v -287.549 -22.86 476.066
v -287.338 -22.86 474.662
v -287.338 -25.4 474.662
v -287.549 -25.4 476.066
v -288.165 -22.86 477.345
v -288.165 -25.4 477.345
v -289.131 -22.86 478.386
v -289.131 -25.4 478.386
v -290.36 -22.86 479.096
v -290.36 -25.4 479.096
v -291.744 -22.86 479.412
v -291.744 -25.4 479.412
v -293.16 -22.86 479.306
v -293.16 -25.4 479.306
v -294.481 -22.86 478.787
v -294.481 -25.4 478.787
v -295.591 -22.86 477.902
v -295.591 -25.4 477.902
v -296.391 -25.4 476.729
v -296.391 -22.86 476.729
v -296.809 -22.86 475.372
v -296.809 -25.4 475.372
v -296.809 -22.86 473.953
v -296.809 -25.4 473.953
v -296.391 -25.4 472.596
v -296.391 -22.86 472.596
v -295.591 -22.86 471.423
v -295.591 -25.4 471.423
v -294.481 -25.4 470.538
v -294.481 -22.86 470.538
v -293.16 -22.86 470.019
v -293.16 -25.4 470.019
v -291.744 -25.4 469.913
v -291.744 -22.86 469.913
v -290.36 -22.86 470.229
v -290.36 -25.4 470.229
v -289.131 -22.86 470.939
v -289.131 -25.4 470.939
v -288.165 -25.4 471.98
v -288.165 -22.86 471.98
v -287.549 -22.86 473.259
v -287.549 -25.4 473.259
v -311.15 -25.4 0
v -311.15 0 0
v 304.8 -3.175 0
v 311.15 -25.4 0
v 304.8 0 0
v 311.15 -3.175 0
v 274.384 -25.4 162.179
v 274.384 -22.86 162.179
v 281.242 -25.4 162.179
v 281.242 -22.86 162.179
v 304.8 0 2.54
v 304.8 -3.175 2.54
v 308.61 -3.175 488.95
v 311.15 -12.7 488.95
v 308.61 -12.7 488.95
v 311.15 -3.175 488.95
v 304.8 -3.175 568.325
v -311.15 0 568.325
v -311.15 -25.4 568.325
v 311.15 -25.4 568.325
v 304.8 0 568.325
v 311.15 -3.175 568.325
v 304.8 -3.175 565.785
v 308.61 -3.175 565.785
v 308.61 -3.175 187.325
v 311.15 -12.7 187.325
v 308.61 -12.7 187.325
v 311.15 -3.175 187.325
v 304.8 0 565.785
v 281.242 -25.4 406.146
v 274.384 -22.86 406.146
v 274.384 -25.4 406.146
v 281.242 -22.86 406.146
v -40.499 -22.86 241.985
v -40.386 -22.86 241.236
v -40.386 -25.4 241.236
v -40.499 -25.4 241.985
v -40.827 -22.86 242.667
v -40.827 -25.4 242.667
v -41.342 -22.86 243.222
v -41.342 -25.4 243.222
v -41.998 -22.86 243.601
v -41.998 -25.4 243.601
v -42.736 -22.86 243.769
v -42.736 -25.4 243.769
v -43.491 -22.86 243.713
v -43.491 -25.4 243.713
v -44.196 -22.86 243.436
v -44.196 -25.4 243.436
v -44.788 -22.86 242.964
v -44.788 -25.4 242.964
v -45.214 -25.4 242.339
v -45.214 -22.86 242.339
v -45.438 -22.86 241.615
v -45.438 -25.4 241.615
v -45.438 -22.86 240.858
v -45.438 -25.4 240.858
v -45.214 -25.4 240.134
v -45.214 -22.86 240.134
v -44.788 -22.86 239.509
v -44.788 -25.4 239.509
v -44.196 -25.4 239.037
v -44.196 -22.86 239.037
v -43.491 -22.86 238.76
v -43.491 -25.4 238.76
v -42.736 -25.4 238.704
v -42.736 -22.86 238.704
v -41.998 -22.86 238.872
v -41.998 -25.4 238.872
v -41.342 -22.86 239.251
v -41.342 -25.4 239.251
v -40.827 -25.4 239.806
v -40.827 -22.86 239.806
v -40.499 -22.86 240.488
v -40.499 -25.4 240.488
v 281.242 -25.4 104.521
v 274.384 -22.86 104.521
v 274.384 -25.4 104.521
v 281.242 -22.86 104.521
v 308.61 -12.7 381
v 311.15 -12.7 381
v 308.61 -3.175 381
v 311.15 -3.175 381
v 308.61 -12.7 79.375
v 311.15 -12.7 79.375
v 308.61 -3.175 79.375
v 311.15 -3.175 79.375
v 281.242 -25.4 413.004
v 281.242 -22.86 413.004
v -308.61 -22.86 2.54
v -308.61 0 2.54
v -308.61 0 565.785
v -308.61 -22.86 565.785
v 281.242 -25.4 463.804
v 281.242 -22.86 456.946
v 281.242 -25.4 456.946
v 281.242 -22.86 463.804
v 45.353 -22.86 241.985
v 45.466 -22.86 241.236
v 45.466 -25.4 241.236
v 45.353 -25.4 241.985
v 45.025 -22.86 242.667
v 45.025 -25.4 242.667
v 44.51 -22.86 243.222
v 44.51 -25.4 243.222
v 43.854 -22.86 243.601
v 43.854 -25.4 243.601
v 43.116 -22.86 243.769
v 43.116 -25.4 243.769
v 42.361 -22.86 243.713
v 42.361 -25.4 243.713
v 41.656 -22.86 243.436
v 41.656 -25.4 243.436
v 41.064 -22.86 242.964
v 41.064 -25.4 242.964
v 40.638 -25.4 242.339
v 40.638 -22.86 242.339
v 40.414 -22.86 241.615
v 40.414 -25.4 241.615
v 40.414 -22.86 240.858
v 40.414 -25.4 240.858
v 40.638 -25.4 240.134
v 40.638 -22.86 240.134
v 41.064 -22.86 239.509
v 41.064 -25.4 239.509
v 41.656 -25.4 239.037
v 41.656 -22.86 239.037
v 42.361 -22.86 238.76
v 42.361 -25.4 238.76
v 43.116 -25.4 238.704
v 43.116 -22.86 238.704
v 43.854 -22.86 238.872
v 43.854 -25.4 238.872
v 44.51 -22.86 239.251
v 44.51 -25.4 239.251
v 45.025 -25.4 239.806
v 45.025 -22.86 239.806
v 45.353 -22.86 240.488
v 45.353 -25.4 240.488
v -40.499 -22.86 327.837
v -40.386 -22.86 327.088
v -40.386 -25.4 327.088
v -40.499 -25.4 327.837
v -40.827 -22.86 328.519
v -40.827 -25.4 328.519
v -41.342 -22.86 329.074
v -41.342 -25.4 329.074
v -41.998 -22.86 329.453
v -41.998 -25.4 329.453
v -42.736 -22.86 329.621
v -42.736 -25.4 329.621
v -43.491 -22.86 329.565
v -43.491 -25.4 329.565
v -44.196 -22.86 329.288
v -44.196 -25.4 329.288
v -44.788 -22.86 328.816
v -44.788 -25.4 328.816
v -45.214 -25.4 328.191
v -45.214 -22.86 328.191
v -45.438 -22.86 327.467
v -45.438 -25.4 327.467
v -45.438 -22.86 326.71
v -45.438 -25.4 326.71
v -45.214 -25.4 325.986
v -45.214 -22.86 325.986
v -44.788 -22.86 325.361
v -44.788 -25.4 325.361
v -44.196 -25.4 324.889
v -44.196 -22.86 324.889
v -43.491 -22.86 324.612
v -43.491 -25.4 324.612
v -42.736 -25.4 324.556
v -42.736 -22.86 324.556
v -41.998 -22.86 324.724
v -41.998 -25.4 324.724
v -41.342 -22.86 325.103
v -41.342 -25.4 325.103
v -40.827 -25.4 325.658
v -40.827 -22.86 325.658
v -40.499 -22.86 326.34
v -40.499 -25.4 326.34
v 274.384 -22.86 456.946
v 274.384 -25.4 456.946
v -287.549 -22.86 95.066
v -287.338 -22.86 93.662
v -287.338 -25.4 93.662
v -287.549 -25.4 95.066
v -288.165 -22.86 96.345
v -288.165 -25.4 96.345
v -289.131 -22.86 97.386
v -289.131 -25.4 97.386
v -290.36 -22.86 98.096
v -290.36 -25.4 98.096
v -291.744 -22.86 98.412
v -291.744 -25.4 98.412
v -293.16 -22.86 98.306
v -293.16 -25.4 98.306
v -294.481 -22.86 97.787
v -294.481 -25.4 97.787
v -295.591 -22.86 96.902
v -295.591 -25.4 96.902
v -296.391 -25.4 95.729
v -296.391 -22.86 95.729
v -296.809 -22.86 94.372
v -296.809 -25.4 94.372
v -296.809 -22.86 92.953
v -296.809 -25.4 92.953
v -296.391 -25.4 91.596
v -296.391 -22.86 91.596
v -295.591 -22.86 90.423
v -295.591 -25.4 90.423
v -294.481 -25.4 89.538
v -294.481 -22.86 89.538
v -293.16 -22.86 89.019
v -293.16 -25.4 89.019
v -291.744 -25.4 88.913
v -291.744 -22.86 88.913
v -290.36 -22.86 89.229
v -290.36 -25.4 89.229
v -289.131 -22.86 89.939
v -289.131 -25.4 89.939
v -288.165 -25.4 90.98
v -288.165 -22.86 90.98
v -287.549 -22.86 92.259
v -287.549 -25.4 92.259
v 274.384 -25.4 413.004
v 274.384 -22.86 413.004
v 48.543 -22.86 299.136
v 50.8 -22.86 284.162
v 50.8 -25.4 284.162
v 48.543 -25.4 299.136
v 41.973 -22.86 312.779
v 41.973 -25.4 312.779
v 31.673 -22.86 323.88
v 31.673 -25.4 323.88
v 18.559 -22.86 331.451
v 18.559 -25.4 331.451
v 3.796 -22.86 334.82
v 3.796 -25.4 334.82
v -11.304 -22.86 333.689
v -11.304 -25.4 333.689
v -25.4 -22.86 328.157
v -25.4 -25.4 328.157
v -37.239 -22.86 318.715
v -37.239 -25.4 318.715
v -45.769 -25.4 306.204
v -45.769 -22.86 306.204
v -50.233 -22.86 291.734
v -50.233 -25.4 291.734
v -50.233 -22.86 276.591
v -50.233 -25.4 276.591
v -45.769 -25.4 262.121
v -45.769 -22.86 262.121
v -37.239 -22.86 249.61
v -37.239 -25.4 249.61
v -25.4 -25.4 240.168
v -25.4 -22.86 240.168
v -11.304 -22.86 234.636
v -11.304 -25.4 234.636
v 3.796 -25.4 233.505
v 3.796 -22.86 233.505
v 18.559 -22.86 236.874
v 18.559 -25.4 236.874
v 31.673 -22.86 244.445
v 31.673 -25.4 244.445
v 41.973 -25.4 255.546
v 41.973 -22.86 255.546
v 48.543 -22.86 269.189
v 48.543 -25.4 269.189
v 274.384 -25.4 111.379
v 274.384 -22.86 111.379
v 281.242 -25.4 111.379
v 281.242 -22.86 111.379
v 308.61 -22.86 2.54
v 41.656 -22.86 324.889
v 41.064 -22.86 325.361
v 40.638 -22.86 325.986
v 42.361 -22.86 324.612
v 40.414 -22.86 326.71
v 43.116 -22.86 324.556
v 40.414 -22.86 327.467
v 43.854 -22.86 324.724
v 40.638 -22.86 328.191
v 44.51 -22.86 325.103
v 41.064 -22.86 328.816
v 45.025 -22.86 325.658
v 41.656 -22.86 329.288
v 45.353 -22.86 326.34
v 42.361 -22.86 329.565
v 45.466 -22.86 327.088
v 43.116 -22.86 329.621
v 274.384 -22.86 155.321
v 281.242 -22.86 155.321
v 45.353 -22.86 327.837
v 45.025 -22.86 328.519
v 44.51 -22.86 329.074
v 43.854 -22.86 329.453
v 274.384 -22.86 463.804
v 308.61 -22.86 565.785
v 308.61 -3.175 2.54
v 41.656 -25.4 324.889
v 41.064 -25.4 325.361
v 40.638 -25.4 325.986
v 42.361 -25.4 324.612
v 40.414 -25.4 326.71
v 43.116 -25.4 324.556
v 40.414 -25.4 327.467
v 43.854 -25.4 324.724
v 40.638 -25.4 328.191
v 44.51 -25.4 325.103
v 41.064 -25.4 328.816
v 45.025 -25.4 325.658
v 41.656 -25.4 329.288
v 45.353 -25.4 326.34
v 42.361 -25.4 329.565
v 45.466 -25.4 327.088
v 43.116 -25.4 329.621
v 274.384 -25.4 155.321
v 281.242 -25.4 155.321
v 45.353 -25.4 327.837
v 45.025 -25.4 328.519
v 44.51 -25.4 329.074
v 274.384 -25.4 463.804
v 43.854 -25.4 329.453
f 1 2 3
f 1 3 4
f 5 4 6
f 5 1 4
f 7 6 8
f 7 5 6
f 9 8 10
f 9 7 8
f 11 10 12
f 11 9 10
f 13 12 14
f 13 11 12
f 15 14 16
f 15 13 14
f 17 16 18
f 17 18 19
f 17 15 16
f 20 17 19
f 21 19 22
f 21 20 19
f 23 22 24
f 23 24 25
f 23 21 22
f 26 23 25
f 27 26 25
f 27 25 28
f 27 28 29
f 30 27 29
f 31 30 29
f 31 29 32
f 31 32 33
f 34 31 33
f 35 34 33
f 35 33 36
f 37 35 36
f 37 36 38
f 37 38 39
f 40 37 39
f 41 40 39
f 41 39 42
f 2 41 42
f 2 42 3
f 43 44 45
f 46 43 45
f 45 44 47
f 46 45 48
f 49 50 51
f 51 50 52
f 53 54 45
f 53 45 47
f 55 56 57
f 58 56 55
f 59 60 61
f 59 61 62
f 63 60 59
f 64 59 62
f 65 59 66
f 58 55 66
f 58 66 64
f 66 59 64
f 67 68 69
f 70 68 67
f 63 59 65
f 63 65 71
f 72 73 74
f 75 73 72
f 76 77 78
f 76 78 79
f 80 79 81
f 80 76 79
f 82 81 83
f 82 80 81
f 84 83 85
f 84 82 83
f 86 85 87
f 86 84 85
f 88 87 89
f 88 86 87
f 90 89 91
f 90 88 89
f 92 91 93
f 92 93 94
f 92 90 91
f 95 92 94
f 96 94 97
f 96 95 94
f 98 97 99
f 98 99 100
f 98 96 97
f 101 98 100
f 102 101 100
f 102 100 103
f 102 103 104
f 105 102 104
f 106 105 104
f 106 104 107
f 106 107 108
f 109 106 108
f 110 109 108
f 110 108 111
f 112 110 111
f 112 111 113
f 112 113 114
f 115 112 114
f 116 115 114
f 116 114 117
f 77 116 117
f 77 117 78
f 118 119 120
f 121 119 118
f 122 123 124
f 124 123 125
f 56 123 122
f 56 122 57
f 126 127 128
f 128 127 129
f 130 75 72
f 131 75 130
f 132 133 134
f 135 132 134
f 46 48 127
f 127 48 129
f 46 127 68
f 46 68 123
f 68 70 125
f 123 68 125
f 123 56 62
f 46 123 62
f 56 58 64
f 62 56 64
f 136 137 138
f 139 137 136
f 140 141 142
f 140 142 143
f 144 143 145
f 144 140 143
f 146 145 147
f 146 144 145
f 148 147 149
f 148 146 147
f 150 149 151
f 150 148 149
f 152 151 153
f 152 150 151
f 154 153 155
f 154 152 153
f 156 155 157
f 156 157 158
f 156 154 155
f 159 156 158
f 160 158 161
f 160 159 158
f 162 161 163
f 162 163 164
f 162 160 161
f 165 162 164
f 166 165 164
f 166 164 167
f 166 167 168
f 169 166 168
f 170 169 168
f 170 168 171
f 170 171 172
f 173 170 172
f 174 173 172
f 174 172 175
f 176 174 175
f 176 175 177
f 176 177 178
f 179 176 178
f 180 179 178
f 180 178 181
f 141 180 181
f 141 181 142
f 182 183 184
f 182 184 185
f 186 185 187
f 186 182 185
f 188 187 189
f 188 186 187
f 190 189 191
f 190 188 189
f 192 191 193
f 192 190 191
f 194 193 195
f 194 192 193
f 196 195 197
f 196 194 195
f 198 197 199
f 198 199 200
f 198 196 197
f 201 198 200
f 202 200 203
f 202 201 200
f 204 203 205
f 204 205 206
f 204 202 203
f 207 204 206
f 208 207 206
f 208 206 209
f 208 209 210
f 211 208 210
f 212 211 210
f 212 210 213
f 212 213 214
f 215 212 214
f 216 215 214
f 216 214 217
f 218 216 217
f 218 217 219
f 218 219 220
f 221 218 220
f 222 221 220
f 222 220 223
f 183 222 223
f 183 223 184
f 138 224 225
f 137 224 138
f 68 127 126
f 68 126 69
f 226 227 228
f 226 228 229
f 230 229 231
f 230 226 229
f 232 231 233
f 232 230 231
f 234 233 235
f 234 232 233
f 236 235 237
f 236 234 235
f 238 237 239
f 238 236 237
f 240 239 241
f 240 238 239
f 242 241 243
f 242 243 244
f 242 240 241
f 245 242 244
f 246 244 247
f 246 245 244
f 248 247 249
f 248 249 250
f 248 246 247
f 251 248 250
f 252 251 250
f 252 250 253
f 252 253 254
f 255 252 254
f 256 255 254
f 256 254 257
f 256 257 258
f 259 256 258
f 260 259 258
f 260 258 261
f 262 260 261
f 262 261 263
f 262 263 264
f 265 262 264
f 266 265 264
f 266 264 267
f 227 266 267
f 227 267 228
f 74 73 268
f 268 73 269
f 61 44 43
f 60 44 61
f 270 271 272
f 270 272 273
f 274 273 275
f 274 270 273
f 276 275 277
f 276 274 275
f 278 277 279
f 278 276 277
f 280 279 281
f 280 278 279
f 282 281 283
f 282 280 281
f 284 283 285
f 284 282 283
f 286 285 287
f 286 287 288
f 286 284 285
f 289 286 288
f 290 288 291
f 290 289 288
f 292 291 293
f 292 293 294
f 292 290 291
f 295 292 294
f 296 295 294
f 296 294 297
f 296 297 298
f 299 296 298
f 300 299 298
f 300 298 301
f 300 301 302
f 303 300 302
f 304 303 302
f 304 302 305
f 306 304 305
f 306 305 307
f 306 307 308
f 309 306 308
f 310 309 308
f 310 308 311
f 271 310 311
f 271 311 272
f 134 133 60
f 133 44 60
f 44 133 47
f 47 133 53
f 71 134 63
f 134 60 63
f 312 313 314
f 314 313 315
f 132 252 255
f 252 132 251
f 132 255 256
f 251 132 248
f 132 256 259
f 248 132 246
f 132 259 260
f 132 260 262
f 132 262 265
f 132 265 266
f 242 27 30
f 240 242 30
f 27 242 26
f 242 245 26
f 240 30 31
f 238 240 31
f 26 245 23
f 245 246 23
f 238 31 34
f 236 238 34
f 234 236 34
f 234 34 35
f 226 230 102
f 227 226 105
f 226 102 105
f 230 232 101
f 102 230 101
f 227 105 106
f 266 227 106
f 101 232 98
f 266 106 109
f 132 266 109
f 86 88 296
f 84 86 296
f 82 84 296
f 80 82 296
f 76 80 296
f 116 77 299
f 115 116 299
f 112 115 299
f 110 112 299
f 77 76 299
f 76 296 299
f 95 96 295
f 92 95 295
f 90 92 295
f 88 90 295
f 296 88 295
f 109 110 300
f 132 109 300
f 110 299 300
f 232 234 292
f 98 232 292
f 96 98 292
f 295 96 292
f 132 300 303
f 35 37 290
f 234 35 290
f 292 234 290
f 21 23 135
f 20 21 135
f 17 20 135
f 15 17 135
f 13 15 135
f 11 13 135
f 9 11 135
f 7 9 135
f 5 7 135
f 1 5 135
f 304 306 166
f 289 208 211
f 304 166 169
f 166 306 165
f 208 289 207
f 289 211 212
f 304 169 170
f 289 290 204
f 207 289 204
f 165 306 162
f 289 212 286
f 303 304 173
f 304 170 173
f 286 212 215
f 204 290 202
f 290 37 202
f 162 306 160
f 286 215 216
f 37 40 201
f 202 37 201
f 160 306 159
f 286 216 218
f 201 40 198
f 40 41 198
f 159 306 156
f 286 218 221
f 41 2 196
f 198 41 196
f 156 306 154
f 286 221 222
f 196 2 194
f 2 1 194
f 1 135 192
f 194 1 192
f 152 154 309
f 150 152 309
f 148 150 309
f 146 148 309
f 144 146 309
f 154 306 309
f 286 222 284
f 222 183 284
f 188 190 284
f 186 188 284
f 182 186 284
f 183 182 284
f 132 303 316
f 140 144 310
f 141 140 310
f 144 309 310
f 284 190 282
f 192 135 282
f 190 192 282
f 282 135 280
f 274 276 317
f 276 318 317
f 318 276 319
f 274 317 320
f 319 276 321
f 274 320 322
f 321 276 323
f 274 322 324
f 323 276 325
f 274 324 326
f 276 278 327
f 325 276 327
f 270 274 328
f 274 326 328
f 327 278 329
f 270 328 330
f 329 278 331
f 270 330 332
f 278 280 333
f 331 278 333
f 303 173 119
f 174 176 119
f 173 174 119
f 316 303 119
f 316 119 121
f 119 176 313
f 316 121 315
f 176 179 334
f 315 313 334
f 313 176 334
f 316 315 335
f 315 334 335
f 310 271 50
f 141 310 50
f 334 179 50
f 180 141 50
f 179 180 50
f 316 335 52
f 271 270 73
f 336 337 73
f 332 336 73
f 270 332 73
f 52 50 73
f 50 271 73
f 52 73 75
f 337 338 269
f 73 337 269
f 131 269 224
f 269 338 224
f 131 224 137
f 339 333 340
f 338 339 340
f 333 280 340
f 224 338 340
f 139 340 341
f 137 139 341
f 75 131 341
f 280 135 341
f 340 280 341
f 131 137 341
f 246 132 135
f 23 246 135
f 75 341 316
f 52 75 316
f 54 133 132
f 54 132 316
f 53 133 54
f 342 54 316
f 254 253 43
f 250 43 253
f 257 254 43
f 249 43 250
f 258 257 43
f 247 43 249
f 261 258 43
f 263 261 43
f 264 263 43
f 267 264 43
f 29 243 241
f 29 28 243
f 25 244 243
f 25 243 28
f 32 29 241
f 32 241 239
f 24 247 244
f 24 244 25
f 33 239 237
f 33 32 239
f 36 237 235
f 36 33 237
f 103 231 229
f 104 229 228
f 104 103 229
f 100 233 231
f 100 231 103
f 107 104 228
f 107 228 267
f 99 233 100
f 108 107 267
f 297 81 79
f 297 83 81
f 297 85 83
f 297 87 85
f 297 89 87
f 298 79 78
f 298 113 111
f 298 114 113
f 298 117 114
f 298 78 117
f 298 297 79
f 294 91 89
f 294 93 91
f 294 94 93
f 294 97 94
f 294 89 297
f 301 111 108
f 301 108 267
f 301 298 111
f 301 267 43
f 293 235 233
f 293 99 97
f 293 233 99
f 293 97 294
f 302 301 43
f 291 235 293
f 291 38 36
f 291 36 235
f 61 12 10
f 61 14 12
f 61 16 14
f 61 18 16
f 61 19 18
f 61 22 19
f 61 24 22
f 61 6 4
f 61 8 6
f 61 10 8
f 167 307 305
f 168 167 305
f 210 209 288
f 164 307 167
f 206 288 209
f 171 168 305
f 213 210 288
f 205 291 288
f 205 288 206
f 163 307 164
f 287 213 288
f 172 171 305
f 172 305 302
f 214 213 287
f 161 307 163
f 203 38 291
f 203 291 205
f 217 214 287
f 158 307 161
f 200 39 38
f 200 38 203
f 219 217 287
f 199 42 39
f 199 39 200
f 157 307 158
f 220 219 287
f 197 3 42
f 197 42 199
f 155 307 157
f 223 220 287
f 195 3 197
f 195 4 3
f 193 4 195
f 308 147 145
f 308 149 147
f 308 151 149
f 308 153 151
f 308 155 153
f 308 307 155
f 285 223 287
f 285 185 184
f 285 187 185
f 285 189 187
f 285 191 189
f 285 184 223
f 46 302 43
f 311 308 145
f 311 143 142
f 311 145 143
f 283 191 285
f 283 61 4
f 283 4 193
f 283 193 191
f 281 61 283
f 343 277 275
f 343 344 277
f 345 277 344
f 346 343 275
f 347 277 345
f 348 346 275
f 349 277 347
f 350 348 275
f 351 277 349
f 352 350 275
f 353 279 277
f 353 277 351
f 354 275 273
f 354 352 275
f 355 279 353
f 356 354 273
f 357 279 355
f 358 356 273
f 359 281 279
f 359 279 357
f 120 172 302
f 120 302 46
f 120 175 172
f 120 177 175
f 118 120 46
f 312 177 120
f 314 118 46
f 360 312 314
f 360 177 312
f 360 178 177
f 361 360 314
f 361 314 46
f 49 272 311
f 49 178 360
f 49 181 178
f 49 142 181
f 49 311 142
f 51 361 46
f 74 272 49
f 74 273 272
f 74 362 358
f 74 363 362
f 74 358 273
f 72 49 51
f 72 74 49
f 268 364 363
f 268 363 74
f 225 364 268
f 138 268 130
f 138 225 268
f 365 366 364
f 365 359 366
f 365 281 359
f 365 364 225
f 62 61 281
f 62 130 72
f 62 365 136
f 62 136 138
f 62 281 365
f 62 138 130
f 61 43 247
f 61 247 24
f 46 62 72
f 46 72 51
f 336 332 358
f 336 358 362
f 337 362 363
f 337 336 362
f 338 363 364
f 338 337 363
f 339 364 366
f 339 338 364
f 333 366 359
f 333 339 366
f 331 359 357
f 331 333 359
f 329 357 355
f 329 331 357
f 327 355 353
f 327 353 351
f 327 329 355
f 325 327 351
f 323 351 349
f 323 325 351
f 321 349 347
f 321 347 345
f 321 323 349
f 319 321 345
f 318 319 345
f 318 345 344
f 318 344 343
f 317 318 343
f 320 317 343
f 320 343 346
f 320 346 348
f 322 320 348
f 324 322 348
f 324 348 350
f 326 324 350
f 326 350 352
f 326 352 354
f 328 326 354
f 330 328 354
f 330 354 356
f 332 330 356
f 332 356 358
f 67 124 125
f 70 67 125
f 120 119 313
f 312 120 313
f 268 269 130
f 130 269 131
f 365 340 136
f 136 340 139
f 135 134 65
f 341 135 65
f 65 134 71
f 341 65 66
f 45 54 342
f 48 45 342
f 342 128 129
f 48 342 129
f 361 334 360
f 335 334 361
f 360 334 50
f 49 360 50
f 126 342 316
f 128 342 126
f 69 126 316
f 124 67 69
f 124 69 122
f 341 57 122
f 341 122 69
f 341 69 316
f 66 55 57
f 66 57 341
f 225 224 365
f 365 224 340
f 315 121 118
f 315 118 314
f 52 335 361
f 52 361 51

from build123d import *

# Parameters (mm, degrees)
F0_W     = 622.3
F0_H     = 568.325
F0_R     = 4.7625
F0_R_2   = 2.54
F0_W_2   = 6.858
F0_H_2   = 6.858
F0_R_3   = 50.8
F1_DEPTH = 25.4
F2_T     = -2.54
F3_W     = 617.22
F3_H     = 22.86
F4_DEPTH = 563.245
F5_W     = 6.35
F5_H     = 3.175
F6_DEPTH = 568.326
F7_W     = 12.7
F7_H     = 107.95
F8_DEPTH = 2.54


with BuildPart() as f1:
    # F0 (on Front) → F1 (new body)
    with BuildSketch(Plane.XZ):
        with Locations((0, 284.1625)):
            Rectangle(F0_W, F0_H)
        with Locations((-292.1, 93.6625)):
            Circle(F0_R, mode=Mode.SUBTRACT)
        with Locations((-42.926, 241.2365)):
            Circle(F0_R_2, mode=Mode.SUBTRACT)
        with Locations((277.8125, 107.95)):
            Rectangle(F0_W_2, F0_H_2, mode=Mode.SUBTRACT)
        with Locations((42.926, 241.2365)):
            Circle(F0_R_2, mode=Mode.SUBTRACT)
        with Locations((277.8125, 158.75)):
            Rectangle(F0_W_2, F0_H_2, mode=Mode.SUBTRACT)
        with Locations((-42.926, 327.0885)):
            Circle(F0_R_2, mode=Mode.SUBTRACT)
        with Locations((-292.1, 474.6625)):
            Circle(F0_R, mode=Mode.SUBTRACT)
        with Locations((0, 284.1625)):
            Circle(F0_R_3, mode=Mode.SUBTRACT)
        with Locations((42.926, 327.0885)):
            Circle(F0_R_2, mode=Mode.SUBTRACT)
        with Locations((277.8125, 409.575)):
            Rectangle(F0_W_2, F0_H_2, mode=Mode.SUBTRACT)
        with Locations((277.8125, 460.375)):
            Rectangle(F0_W_2, F0_H_2, mode=Mode.SUBTRACT)
    extrude(amount=F1_DEPTH)

    # F2
    f2_openings = [f1.faces().sort_by_distance(p)[0] for p in [
        (302.722363, 0, 284.1625),
    ]]
    offset(amount=F2_T, openings=f2_openings, kind=Kind.INTERSECTION)

    # F3 (on face) → F4 (cut, through all)
    with BuildSketch(Plane.XY.offset(2.54)):
        with Locations((0, -11.43)):
            Rectangle(F3_W, F3_H)
    extrude(amount=F4_DEPTH, mode=Mode.SUBTRACT)

    # F5 (on face) → F6 (cut, through all)
    with BuildSketch(Plane.XY.offset(568.325)):
        with Locations((307.975, -1.5875)):
            Rectangle(F5_W, F5_H)
    extrude(amount=-F6_DEPTH, mode=Mode.SUBTRACT)

    # F7 (on face) → F8 (cut, through all)
    with BuildSketch(Plane.YZ.offset(311.15)):
        with Locations((-6.35, 434.975)):
            Rectangle(F7_W, F7_H)
        with Locations((-6.35, 133.35)):
            Rectangle(F7_W, F7_H)
    extrude(amount=-F8_DEPTH, mode=Mode.SUBTRACT)


solid = f1.part
